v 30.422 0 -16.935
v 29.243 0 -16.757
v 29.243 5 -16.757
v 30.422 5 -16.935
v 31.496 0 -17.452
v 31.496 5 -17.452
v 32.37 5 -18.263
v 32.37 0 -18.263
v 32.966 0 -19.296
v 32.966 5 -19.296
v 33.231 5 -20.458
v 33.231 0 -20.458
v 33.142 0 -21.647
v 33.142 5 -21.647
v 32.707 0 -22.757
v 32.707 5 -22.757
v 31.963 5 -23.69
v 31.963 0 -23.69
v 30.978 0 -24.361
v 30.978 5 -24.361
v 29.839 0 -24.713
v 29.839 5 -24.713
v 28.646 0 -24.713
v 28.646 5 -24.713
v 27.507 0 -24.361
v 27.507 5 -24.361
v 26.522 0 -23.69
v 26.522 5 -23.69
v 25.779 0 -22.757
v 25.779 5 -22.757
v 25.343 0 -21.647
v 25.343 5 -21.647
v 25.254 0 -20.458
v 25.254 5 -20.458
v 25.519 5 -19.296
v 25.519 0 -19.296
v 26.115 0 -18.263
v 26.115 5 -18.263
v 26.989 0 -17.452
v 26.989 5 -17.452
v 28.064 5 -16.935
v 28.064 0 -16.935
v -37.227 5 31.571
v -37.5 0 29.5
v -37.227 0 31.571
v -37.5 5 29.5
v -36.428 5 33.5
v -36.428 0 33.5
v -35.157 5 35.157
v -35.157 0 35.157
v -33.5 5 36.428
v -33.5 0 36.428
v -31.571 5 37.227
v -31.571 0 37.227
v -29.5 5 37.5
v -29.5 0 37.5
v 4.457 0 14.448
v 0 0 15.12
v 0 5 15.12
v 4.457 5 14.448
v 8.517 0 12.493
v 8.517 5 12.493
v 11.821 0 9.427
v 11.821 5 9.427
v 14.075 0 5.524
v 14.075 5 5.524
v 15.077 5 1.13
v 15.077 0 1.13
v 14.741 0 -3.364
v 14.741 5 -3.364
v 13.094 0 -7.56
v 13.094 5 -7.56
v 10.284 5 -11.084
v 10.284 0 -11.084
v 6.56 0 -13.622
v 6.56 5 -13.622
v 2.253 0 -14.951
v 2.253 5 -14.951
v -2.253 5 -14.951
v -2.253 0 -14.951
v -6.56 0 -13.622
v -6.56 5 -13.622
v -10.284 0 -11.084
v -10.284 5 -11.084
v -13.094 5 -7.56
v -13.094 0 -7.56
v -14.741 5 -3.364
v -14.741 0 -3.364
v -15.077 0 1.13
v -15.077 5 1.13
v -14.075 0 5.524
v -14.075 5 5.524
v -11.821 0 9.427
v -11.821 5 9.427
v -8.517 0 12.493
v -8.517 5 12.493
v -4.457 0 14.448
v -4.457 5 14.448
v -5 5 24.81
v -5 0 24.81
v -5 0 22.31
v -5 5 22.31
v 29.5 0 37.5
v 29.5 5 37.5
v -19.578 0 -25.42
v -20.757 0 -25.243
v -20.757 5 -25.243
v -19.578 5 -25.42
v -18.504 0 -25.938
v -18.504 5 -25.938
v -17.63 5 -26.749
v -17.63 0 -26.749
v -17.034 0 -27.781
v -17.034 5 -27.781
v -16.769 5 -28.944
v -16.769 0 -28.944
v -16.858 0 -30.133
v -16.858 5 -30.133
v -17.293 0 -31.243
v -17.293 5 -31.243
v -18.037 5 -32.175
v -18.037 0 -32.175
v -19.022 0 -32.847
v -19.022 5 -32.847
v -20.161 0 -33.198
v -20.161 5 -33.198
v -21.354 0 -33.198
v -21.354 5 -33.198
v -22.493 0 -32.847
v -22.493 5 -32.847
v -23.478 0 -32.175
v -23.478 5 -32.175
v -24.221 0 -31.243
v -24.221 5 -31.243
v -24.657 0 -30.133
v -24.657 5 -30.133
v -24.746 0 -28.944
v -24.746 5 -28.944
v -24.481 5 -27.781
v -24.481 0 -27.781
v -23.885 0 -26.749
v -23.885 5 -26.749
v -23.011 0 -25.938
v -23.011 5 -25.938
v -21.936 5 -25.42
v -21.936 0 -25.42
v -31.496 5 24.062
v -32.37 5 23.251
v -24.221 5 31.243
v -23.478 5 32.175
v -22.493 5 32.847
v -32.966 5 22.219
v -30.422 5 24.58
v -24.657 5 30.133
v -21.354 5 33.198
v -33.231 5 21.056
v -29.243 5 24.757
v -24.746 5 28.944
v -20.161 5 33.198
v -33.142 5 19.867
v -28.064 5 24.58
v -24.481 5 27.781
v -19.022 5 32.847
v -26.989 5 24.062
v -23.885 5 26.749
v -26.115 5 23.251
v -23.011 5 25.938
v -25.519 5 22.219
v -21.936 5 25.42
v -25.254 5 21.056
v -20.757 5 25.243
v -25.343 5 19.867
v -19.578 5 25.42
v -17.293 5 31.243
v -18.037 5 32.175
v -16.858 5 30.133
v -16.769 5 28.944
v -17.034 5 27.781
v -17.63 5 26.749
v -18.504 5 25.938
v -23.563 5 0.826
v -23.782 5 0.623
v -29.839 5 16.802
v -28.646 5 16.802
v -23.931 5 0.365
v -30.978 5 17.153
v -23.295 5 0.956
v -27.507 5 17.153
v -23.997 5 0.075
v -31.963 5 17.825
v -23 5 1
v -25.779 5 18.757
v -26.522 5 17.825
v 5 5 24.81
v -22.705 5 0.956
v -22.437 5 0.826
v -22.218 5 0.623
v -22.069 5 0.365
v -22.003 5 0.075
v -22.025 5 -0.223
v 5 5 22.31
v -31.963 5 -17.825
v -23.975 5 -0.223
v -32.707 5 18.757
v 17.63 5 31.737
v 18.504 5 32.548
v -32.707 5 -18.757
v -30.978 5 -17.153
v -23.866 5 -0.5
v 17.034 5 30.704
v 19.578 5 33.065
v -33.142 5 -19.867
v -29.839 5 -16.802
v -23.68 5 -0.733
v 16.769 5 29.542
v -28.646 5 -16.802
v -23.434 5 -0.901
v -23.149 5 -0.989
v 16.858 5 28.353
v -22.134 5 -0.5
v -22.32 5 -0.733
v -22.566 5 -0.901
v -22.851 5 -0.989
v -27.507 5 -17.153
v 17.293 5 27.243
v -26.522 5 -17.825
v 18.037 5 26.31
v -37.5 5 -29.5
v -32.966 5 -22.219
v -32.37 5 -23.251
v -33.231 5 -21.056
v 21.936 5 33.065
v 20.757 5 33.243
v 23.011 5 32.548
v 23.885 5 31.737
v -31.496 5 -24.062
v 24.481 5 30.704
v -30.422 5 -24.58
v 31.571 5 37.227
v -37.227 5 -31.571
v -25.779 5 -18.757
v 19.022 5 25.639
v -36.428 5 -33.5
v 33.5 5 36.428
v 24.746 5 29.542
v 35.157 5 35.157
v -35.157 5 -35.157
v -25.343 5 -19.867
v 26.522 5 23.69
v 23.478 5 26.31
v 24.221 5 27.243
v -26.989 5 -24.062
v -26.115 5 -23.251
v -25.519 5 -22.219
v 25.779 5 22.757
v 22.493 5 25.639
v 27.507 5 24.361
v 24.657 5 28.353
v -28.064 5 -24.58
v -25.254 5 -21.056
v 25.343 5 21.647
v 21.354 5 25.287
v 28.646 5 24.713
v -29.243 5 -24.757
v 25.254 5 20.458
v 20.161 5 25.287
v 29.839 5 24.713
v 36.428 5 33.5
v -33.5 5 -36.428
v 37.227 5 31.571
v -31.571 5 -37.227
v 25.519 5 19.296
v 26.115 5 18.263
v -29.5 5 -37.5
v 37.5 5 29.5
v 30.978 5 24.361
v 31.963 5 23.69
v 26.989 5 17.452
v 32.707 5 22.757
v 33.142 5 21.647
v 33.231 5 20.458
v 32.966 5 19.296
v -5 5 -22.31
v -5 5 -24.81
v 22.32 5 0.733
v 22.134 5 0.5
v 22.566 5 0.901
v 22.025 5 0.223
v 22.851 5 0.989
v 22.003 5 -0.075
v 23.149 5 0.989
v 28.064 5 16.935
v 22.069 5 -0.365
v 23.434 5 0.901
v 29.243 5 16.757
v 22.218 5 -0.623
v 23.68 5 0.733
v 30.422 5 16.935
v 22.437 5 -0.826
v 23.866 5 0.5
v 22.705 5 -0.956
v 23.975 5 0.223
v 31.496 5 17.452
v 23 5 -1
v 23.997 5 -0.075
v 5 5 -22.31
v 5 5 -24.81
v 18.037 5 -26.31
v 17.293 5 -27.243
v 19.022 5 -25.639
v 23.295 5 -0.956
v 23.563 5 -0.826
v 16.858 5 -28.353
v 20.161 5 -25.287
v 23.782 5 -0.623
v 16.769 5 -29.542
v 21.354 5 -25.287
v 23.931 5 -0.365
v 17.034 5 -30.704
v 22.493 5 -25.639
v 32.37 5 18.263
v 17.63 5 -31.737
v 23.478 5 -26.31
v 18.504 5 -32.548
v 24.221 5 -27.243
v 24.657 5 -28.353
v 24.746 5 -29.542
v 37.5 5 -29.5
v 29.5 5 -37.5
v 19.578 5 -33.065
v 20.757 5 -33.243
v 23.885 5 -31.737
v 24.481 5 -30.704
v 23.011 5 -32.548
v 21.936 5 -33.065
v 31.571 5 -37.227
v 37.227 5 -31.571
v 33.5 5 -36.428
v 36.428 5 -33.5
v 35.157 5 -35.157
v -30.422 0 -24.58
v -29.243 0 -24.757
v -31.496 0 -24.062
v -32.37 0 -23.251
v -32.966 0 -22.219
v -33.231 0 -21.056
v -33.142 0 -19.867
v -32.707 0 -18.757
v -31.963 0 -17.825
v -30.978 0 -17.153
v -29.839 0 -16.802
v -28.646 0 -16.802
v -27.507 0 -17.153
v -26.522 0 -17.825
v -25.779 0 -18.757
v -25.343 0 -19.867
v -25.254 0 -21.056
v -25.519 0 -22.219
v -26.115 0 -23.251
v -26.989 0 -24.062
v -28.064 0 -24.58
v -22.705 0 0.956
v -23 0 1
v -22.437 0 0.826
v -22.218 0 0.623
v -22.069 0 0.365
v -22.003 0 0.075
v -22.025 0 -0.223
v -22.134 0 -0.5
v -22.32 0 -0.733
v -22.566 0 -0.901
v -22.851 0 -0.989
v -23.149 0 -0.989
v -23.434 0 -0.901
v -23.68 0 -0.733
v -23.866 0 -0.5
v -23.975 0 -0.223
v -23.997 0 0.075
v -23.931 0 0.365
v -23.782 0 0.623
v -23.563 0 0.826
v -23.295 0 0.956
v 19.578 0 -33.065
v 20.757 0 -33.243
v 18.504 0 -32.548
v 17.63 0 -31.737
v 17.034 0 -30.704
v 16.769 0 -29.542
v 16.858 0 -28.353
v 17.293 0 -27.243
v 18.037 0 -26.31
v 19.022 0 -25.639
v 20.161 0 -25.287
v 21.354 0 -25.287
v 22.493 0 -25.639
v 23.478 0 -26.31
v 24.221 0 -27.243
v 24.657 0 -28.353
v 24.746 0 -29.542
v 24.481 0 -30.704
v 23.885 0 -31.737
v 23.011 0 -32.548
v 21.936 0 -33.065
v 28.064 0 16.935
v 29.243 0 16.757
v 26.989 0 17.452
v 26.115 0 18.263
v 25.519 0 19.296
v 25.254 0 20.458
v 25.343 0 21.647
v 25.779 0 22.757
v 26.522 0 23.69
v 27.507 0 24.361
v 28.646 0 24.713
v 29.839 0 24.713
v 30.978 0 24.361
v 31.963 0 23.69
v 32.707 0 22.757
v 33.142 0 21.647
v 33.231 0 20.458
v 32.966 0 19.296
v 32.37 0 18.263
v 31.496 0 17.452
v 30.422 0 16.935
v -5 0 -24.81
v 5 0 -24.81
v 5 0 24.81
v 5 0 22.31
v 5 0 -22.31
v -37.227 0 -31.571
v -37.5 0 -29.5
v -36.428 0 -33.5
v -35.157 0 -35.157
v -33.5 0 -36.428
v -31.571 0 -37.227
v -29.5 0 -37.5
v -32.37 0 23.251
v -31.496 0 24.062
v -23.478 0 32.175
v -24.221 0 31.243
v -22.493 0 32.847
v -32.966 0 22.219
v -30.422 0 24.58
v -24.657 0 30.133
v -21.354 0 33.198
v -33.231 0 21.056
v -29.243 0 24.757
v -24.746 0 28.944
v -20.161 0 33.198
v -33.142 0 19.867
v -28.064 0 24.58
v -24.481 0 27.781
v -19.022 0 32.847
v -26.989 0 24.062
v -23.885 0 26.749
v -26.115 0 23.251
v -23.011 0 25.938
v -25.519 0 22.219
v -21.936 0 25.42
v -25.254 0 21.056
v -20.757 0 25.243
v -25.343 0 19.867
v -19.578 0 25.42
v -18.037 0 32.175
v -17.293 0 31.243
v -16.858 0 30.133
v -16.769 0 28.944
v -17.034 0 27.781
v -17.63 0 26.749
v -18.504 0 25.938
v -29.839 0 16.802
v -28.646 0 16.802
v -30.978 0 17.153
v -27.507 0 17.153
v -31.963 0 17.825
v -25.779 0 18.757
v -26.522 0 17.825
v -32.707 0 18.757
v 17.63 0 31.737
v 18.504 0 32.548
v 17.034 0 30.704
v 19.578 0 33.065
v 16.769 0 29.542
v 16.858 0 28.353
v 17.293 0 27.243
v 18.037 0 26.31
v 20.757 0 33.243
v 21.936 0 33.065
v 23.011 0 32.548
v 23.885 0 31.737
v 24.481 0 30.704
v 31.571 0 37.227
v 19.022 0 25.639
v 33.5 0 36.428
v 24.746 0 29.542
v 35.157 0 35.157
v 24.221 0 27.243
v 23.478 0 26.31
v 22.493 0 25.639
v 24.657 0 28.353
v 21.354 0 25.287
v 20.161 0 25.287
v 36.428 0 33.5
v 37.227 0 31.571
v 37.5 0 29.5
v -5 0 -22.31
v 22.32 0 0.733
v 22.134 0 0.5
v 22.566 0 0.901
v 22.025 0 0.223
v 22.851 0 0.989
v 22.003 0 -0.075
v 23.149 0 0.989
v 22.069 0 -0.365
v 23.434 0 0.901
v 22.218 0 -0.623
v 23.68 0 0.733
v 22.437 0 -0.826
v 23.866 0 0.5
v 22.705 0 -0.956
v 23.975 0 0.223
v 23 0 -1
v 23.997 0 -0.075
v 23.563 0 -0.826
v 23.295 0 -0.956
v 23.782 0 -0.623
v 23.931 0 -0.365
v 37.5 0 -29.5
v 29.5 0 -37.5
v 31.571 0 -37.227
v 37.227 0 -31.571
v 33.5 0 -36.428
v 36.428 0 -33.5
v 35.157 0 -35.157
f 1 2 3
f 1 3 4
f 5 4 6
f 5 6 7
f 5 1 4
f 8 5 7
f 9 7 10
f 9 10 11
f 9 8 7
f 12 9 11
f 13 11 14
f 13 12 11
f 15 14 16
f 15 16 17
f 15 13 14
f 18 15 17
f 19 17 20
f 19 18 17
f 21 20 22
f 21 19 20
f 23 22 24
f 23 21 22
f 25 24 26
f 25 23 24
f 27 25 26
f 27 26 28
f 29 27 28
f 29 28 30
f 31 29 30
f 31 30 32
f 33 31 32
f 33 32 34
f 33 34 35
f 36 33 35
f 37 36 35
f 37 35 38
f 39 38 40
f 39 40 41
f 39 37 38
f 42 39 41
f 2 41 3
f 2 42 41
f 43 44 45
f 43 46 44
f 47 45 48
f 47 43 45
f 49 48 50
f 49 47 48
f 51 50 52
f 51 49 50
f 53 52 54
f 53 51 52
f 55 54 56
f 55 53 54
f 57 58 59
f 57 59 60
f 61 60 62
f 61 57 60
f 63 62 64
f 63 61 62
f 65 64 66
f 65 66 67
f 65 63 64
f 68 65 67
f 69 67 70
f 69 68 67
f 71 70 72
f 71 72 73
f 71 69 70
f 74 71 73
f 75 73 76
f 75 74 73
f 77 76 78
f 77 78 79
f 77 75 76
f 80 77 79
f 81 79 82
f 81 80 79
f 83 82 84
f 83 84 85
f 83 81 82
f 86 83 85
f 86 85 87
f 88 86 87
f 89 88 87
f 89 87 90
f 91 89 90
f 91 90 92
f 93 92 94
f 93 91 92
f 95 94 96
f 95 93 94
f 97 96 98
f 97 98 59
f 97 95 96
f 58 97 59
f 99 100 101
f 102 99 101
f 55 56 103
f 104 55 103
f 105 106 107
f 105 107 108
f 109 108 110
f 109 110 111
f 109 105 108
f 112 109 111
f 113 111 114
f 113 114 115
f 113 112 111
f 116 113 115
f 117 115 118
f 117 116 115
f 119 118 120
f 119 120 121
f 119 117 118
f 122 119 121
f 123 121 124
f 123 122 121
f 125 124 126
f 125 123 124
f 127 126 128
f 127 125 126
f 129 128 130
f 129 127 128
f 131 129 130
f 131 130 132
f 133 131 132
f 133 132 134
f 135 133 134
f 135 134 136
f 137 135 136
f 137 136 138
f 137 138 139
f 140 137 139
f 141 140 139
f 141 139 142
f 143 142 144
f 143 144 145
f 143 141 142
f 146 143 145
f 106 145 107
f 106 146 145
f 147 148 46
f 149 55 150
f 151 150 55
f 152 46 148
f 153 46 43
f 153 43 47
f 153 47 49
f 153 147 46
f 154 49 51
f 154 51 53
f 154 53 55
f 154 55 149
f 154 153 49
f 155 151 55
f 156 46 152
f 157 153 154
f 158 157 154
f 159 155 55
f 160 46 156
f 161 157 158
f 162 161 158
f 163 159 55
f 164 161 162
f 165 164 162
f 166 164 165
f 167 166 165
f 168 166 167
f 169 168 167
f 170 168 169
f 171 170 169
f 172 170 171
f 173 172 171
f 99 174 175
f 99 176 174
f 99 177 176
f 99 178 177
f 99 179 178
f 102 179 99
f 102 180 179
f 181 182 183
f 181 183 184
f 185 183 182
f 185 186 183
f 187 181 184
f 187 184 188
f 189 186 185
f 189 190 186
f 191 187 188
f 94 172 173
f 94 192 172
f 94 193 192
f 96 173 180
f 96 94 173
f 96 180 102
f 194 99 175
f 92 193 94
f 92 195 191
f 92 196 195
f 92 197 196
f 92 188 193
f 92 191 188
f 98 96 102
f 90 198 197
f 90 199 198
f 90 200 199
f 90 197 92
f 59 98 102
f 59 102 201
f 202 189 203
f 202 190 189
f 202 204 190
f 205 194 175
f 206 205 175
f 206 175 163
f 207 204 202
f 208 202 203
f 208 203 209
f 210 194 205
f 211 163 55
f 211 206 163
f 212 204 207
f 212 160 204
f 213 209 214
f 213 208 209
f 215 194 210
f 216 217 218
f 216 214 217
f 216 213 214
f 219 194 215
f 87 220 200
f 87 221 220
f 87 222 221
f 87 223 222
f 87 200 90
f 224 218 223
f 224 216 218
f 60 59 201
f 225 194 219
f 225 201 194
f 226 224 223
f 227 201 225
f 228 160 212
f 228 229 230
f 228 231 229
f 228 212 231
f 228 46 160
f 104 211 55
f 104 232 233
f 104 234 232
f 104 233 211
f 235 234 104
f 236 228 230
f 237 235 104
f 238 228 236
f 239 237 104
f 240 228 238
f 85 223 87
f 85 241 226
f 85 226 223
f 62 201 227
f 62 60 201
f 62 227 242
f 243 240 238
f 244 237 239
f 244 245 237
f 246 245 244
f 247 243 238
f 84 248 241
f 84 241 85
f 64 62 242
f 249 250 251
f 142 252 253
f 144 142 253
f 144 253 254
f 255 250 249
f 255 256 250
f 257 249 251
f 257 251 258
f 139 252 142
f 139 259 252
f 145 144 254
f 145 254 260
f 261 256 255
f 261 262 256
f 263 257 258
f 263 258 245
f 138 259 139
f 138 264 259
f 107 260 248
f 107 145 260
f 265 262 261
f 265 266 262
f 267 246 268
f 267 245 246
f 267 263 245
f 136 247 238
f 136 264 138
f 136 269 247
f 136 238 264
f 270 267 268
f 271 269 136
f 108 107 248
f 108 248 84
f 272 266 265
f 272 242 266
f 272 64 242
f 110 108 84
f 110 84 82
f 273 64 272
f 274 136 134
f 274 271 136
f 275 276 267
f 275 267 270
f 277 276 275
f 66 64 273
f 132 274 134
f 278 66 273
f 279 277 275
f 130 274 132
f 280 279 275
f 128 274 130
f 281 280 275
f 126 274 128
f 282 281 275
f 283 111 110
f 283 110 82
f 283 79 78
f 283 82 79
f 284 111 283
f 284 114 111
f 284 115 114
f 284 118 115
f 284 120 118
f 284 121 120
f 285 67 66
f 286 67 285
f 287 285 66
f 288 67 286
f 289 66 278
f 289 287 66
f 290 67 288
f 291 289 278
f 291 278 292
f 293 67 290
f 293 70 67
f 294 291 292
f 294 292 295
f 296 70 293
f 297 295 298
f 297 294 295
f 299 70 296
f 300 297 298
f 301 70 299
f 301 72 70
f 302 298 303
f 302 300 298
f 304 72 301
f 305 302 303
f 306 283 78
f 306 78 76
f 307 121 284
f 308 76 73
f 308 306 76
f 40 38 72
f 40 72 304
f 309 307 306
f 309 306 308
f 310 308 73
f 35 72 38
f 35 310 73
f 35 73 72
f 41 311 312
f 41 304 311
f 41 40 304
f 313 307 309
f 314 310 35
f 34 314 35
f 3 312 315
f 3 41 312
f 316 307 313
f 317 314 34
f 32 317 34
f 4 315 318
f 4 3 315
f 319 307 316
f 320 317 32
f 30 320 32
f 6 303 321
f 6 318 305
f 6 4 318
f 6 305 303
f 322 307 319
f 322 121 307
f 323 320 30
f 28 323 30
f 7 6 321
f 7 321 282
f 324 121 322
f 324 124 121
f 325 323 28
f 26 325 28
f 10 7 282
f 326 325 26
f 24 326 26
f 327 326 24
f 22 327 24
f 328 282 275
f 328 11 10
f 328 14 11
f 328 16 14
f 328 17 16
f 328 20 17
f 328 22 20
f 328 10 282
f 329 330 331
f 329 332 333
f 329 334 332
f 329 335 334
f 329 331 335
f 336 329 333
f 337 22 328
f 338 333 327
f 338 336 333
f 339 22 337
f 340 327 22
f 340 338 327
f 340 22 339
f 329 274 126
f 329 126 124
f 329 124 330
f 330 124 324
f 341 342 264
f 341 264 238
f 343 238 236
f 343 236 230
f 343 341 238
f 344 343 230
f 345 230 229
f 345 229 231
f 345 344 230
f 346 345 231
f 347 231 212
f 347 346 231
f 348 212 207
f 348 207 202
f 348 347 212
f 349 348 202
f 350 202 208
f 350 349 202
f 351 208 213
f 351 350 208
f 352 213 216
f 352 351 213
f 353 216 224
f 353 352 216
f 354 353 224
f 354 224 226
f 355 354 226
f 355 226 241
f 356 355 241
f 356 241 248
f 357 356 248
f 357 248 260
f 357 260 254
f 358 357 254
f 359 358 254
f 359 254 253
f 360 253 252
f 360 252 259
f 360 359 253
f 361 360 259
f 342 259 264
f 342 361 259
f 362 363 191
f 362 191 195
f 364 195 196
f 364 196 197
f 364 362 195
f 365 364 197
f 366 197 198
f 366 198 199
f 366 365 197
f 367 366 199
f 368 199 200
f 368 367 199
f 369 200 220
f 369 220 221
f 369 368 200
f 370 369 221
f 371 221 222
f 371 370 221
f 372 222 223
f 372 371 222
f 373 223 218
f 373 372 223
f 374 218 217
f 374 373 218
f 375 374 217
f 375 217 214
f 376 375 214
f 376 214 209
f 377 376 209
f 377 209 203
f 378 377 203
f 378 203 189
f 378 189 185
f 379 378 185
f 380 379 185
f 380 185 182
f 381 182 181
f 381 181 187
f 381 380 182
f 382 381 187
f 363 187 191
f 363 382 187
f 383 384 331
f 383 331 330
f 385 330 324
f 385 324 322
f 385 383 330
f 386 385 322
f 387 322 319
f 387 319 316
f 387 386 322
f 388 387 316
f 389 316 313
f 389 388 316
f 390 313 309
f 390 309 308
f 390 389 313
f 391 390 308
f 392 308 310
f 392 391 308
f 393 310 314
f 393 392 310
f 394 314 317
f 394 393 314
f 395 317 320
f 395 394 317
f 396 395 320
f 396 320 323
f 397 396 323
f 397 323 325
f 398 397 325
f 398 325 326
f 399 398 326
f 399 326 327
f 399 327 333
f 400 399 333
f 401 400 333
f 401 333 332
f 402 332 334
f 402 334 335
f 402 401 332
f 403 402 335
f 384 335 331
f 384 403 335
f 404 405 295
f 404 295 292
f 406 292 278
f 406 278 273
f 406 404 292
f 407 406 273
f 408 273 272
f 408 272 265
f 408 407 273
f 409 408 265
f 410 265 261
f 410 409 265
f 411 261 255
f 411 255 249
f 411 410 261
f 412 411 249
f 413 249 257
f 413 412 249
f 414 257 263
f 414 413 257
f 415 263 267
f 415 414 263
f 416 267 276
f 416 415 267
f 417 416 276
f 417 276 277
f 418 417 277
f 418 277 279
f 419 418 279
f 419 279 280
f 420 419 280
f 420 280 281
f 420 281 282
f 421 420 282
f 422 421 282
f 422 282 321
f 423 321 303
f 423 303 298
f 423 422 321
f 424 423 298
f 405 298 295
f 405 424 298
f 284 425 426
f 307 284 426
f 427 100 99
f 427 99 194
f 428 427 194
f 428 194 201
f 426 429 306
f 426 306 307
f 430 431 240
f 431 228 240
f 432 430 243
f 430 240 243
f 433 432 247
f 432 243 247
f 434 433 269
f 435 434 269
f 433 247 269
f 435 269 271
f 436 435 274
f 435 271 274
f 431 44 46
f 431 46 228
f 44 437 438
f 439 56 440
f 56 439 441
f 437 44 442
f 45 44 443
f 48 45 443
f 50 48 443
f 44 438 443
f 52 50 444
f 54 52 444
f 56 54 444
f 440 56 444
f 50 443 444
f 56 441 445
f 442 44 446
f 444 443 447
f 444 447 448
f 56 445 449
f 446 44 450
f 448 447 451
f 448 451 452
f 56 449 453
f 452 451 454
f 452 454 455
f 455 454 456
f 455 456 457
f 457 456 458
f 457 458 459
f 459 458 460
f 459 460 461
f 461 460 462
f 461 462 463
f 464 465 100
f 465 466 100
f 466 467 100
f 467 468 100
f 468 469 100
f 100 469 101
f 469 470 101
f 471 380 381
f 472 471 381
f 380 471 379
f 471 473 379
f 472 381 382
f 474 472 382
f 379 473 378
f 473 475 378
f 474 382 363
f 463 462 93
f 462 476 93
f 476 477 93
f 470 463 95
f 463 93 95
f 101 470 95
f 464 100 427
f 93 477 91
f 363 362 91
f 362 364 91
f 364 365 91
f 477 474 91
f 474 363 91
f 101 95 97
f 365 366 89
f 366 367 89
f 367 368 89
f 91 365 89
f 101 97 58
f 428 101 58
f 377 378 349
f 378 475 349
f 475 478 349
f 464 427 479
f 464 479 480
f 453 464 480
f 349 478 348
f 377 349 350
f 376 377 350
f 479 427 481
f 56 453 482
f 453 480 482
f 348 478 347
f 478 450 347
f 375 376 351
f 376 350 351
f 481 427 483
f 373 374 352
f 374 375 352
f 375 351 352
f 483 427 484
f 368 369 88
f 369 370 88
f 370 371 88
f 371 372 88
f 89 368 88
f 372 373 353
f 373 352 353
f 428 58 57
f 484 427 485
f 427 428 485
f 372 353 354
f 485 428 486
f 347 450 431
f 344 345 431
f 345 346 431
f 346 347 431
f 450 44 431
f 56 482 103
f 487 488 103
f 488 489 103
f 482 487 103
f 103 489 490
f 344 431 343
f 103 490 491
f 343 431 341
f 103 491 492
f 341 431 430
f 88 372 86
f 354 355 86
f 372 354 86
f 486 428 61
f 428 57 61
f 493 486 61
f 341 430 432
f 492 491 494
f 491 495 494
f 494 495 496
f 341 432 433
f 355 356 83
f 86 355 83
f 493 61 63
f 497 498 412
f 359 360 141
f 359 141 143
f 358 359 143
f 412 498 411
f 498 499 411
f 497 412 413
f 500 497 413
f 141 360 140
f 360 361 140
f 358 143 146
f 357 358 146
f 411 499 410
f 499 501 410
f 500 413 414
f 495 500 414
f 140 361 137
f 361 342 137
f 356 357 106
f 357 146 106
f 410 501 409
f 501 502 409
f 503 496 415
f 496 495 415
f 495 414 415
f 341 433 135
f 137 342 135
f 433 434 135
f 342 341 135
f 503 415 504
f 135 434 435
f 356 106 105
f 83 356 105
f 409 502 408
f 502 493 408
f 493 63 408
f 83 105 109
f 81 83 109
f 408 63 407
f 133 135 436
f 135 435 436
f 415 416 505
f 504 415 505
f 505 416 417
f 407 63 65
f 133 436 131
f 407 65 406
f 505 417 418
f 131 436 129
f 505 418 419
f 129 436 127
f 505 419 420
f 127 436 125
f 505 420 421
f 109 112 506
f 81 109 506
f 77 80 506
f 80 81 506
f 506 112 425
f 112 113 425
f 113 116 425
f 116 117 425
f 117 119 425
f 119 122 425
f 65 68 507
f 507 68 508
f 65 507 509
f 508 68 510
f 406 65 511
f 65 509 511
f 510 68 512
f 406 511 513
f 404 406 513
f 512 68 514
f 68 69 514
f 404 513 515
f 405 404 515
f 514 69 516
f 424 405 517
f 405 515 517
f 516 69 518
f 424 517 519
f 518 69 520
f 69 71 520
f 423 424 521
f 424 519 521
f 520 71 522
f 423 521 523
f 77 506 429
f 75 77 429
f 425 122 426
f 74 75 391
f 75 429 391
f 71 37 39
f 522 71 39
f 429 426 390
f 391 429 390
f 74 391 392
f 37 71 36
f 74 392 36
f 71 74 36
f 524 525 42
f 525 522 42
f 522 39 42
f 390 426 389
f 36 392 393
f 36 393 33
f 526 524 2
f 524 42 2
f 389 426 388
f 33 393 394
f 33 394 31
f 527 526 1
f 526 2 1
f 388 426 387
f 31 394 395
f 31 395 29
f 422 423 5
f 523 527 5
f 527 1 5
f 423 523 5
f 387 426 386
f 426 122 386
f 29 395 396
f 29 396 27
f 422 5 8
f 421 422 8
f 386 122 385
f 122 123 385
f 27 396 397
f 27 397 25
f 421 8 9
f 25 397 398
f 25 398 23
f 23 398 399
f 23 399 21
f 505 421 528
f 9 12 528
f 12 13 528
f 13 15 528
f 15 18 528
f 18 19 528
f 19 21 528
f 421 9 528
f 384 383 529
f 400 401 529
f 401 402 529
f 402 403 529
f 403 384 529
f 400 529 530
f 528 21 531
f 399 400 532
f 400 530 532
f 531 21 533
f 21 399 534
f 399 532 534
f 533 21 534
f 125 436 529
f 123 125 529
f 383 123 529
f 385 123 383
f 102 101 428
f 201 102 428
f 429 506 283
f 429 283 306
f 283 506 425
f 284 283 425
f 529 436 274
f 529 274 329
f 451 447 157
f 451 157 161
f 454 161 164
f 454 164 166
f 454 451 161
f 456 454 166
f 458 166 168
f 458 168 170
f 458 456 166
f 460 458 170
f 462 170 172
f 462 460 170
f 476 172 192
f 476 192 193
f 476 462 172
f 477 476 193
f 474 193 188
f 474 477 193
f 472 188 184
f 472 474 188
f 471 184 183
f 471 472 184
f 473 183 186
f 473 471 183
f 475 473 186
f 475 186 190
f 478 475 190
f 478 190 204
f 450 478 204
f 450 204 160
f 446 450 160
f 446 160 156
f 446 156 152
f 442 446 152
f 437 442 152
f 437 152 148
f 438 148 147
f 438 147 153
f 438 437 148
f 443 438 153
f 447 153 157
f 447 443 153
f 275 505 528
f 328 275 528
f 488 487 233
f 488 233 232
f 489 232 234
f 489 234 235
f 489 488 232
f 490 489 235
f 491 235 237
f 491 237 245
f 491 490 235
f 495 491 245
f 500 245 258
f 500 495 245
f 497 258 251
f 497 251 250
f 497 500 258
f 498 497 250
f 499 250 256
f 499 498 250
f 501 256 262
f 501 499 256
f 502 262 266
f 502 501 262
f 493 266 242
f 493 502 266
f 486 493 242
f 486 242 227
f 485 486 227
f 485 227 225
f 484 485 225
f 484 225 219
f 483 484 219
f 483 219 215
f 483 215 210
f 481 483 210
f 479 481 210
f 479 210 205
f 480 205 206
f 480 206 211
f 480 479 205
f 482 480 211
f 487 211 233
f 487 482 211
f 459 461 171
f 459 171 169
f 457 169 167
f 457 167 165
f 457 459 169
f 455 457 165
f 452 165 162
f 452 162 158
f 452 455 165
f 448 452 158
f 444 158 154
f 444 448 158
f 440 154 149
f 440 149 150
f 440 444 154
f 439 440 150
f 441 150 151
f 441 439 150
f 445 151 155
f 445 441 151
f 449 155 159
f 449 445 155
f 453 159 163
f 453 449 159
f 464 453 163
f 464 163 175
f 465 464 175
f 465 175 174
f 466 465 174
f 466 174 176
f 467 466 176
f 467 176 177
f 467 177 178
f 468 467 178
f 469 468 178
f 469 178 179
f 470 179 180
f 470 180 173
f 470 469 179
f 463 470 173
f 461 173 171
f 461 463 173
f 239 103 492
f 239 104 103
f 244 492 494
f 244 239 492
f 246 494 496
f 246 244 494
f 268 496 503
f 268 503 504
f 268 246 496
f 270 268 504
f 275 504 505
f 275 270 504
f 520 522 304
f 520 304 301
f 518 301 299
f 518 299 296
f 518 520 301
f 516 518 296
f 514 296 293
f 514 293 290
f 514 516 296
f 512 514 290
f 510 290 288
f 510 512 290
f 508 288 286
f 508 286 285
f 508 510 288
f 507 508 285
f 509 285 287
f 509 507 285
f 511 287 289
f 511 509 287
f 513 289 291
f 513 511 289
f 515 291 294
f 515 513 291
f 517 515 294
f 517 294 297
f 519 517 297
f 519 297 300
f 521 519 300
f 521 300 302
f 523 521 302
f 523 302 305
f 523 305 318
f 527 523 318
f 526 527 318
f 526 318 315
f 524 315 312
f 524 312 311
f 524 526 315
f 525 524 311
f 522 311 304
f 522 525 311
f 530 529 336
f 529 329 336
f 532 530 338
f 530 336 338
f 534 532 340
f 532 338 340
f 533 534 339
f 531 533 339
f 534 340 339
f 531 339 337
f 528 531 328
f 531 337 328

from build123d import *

# Parameters (mm, degrees)
SKETCH2_W           = 75
SKETCH2_H           = 75
SKETCH2_R           = 15.119722523
SKETCH2_R_2         = 1
SKETCH2_R_3         = 4
SKETCH2_W_2         = 10
SKETCH2_H_2         = 2.5
BOSS_EXTRUDE2_DEPTH = 5
FILLET1_R           = 8


with BuildPart() as part:
    # Sketch2 → Boss-Extrude2 (new body)
    with BuildSketch(Plane(origin=(0, 0, 0), x_dir=(1, 0, 0), z_dir=(0, 1, 0))):
        Rectangle(SKETCH2_W, SKETCH2_H)
        with Locations(Location((0, 0, 0), (0, 0, 270))):
            Circle(SKETCH2_R, mode=Mode.SUBTRACT)
        with Locations(Location((-23, 0, 0), (0, 0, 270))):
            Circle(SKETCH2_R_2, mode=Mode.SUBTRACT)
        with Locations(Location((23, 0, 0), (0, 0, 90))):
            Circle(SKETCH2_R_2, mode=Mode.SUBTRACT)
        with Locations(Location((29.242640687, 20.757359313, 0), (0, 0, 270))):
            Circle(SKETCH2_R_3, mode=Mode.SUBTRACT)
        with Locations(Location((20.757359313, 29.242640687, 0), (0, 0, 90))):
            Circle(SKETCH2_R_3, mode=Mode.SUBTRACT)
        with Locations(Location((-20.757359313, -29.242640687, 0), (0, 0, 90))):
            Circle(SKETCH2_R_3, mode=Mode.SUBTRACT)
        with Locations(Location((-29.242640687, -20.757359313, 0), (0, 0, 270))):
            Circle(SKETCH2_R_3, mode=Mode.SUBTRACT)
        with Locations(Location((-20.757359313, 29.242640687, 0), (0, 0, 270))):
            Circle(SKETCH2_R_3, mode=Mode.SUBTRACT)
        with Locations(Location((-29.242640687, 20.757359313, 0), (0, 0, 90))):
            Circle(SKETCH2_R_3, mode=Mode.SUBTRACT)
        with Locations(Location((29.242640687, -20.757359313, 0), (0, 0, 90))):
            Circle(SKETCH2_R_3, mode=Mode.SUBTRACT)
        with Locations(Location((20.757359313, -29.242640687, 0), (0, 0, 270))):
            Circle(SKETCH2_R_3, mode=Mode.SUBTRACT)
        with Locations((0, -23.559960871)):
            Rectangle(SKETCH2_W_2, SKETCH2_H_2, mode=Mode.SUBTRACT)
        with Locations((0, 23.559960871)):
            Rectangle(SKETCH2_W_2, SKETCH2_H_2, mode=Mode.SUBTRACT)
    extrude(amount=BOSS_EXTRUDE2_DEPTH)

    # Fillet1
    fillet1_edges = [part.edges().sort_by_distance(p)[0] for p in [
        (37.5, 2.5, 37.5),
        (-37.5, 2.5, 37.5),
        (-37.5, 2.5, -37.5),
        (37.5, 2.5, -37.5),
    ]]
    fillet(fillet1_edges, radius=FILLET1_R)


solid = part.part
